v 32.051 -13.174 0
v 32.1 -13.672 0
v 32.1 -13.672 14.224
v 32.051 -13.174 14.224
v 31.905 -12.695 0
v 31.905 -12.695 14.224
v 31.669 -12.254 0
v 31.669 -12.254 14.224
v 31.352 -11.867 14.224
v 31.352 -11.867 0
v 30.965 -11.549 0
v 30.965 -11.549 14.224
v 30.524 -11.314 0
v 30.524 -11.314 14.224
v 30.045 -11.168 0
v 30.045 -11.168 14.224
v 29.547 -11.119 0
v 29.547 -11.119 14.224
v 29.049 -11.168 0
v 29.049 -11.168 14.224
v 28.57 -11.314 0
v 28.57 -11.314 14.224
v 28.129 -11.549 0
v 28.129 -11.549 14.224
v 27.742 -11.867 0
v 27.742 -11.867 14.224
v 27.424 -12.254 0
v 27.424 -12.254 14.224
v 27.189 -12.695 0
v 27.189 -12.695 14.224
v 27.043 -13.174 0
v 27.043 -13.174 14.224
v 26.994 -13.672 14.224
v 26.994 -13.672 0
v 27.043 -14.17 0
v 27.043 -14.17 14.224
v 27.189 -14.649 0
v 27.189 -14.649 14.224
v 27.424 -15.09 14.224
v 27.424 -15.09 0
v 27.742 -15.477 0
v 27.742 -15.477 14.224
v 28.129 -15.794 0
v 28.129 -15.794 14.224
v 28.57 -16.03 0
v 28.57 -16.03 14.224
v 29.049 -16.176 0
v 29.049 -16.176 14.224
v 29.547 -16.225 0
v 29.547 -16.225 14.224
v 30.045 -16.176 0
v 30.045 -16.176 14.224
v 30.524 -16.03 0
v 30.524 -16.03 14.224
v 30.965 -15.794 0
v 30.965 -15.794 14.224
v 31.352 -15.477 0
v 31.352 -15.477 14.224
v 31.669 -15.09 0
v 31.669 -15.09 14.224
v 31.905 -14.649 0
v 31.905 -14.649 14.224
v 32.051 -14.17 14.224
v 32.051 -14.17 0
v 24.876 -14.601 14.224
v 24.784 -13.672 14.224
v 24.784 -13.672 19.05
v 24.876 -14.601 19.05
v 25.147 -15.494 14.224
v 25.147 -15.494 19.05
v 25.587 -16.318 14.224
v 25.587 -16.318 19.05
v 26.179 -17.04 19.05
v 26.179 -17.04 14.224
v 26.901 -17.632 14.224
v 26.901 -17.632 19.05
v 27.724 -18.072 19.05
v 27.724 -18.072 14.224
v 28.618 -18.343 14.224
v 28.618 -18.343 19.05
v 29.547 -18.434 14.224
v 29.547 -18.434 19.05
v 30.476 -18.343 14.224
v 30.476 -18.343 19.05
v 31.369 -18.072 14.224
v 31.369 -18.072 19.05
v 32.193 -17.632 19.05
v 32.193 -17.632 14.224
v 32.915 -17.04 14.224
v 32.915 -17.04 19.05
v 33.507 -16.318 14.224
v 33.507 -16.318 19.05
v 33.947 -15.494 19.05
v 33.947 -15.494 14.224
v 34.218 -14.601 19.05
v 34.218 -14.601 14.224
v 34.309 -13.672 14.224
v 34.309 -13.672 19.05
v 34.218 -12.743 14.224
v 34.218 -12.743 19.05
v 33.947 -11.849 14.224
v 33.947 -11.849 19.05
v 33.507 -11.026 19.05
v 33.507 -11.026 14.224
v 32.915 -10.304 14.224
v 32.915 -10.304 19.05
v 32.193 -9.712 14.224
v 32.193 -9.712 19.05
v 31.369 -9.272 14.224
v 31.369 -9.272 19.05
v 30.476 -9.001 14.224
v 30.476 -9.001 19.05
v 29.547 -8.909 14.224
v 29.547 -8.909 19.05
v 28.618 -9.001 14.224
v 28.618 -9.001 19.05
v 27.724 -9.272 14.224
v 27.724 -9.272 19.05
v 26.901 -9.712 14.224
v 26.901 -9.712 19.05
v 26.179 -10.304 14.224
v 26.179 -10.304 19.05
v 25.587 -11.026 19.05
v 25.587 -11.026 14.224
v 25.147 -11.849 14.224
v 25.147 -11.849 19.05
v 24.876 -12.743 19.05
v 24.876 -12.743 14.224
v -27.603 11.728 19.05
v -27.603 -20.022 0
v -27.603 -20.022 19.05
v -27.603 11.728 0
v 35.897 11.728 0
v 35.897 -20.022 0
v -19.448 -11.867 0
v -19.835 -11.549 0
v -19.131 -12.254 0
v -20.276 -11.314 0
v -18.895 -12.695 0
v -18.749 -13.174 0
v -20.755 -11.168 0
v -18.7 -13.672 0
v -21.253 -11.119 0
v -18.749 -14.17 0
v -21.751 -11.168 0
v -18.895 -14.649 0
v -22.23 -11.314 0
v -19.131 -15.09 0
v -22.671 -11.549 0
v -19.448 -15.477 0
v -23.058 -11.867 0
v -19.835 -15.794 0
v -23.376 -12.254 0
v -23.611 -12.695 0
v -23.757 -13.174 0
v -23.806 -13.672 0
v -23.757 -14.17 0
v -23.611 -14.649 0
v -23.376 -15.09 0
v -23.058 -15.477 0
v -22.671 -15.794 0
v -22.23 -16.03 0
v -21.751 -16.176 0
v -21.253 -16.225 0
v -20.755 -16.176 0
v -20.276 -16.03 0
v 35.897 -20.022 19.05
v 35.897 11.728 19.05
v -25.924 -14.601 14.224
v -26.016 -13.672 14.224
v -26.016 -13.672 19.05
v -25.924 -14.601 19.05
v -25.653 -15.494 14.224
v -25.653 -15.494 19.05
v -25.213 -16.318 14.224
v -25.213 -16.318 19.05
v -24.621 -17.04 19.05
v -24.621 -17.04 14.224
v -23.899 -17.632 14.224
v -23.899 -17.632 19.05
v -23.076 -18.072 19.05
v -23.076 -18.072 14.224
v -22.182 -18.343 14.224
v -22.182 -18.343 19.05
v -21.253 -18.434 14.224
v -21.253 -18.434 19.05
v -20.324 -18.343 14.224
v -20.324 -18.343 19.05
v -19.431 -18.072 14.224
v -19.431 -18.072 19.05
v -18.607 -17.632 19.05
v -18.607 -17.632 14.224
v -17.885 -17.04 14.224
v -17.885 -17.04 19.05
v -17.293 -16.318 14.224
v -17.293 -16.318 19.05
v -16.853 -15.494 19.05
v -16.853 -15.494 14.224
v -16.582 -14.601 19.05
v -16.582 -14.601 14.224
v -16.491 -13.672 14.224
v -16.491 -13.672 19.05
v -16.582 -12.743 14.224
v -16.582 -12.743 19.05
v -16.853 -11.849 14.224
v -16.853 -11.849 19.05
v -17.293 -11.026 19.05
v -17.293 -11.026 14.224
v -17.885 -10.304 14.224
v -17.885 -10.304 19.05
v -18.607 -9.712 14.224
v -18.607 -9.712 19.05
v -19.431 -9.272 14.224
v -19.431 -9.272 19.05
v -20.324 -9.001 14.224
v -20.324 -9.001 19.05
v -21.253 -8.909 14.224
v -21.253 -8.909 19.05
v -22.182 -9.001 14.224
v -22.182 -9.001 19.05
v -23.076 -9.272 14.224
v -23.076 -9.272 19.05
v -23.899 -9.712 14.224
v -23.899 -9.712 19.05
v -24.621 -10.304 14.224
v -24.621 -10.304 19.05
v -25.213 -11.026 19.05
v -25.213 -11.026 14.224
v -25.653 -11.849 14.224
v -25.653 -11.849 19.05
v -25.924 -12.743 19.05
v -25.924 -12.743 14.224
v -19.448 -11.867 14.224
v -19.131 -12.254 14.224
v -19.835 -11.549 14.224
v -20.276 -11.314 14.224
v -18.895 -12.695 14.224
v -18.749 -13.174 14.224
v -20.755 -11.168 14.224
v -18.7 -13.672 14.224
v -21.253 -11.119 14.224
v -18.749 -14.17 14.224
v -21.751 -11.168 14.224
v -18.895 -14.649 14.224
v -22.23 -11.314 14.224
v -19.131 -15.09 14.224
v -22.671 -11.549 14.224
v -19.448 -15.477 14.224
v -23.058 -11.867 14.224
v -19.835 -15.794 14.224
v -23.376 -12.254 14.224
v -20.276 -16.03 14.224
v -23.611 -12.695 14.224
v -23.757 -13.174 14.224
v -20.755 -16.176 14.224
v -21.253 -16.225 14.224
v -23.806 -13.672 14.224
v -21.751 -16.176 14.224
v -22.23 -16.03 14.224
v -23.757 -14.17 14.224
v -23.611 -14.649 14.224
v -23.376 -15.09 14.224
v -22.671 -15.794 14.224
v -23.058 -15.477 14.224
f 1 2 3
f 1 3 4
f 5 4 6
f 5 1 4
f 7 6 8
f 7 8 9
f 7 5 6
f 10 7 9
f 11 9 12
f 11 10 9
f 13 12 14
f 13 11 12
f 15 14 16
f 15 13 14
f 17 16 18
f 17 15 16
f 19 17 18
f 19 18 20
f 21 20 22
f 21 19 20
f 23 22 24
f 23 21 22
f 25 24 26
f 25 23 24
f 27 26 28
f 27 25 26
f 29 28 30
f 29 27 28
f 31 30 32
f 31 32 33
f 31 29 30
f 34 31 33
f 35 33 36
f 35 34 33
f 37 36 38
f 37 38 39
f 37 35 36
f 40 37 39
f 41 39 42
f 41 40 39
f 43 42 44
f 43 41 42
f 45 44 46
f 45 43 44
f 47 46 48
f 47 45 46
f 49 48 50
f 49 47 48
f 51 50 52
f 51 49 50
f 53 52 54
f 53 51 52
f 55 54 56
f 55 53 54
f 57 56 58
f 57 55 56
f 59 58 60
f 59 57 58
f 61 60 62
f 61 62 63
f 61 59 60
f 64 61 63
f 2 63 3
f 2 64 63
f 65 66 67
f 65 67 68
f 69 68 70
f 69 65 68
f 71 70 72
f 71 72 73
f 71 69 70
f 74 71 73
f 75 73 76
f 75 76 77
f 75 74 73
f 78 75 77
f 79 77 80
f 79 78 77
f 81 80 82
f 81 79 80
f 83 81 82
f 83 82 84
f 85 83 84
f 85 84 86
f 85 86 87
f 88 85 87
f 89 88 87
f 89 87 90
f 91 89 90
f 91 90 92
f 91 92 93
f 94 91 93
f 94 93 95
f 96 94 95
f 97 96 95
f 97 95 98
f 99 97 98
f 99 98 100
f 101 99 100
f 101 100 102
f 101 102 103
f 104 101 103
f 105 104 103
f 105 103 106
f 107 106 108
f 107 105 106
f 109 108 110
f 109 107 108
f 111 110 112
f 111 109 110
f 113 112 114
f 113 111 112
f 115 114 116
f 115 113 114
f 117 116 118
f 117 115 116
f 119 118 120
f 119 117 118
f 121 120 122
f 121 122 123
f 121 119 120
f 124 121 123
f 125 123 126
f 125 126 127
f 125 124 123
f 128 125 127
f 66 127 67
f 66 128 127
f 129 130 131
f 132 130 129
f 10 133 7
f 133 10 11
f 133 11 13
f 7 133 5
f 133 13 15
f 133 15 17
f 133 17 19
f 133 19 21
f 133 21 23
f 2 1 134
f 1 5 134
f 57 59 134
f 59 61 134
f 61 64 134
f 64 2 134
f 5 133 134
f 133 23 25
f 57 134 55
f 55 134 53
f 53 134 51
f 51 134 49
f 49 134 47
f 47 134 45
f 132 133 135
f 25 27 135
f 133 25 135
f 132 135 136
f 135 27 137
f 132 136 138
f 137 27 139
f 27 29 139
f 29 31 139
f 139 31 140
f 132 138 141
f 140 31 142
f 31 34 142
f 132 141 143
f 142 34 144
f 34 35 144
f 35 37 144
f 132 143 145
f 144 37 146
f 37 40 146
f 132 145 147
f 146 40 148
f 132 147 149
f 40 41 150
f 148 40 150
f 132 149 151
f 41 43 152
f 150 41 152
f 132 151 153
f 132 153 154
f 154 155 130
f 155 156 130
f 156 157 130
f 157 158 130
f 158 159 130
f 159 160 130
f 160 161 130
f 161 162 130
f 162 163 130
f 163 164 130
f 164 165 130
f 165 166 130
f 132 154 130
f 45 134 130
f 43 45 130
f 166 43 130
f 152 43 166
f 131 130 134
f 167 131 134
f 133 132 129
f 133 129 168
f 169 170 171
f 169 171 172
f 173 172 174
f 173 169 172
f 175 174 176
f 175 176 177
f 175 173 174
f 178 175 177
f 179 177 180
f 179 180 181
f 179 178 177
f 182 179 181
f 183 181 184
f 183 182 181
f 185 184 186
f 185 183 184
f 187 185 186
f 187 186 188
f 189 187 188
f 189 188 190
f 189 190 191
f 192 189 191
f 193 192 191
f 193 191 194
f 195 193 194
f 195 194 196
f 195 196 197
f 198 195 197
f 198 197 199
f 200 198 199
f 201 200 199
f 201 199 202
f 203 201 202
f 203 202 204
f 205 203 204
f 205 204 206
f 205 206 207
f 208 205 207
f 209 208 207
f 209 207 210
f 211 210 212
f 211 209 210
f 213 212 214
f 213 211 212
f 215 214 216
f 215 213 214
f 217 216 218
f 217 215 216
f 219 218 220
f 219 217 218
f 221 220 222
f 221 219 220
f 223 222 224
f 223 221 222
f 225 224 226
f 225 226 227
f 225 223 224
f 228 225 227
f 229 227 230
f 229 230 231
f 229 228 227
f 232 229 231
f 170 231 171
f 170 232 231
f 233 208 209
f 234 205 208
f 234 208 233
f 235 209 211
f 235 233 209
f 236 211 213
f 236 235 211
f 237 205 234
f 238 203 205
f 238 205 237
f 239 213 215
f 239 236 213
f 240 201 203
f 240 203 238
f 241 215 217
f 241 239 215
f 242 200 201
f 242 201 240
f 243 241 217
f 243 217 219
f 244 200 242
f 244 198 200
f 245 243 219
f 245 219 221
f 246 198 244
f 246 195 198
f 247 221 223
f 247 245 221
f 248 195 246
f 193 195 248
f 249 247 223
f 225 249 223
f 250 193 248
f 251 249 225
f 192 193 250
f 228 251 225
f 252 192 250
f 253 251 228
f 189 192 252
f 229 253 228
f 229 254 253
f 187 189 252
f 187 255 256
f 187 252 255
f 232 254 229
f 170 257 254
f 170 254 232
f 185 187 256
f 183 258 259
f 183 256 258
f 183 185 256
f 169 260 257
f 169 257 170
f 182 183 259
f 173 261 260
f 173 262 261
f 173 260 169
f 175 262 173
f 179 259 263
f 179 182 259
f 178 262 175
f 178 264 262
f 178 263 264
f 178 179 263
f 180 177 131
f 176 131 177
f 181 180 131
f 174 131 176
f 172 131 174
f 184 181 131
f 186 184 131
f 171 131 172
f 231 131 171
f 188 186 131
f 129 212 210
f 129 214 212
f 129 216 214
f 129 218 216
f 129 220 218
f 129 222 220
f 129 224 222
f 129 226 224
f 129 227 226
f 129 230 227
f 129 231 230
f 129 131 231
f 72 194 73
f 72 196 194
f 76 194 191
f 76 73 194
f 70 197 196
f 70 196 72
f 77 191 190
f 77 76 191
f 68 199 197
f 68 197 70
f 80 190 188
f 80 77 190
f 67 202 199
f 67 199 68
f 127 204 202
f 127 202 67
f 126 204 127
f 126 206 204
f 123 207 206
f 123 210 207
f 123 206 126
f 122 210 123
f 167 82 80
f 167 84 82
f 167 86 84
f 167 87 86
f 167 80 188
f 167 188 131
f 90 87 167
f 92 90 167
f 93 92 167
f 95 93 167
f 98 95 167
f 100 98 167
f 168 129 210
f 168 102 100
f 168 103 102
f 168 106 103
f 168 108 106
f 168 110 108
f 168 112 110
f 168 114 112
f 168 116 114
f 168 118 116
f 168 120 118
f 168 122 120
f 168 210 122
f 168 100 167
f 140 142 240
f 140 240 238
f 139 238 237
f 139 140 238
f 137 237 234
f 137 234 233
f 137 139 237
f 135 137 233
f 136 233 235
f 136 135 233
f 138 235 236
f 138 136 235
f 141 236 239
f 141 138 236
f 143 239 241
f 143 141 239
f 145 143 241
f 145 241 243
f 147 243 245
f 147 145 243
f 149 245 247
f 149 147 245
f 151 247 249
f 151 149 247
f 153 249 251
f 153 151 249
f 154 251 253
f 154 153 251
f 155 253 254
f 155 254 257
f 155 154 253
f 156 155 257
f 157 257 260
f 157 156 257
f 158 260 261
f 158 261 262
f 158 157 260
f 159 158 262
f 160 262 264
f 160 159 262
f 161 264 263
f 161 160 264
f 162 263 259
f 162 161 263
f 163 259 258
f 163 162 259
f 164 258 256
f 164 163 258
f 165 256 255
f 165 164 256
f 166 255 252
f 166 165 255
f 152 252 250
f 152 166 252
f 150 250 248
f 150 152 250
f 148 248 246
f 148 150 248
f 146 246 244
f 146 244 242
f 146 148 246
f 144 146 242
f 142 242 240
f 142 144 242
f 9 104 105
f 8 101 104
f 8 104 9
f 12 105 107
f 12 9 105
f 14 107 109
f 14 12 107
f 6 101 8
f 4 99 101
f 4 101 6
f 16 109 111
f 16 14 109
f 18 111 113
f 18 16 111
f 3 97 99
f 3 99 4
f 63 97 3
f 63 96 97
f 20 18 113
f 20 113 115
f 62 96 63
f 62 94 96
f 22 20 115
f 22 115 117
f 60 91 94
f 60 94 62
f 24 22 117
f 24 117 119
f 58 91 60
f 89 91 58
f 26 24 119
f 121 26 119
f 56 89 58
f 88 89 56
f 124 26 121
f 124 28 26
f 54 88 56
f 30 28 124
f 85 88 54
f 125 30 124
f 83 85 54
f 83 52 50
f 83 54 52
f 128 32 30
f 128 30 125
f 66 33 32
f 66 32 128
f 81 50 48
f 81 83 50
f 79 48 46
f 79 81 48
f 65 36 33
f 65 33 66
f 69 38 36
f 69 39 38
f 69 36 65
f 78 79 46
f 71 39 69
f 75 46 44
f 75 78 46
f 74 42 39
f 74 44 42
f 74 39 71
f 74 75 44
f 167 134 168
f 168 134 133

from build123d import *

# Parameters (mm, degrees)
SKETCH1_W           = 63.5
SKETCH1_H           = 31.75
SKETCH1_R           = 4.7625
BOSS_EXTRUDE1_DEPTH = 19.05
SKETCH1_3_R         = 4.7625
SKETCH1_3_R_2       = 2.5527
BOSS_EXTRUDE2_DEPTH = 14.224


with BuildPart() as part:
    # Sketch1 → Boss-Extrude1 (new body)
    with BuildSketch(Plane.XY):
        with Locations((4.146938776, -4.146938776)):
            Rectangle(SKETCH1_W, SKETCH1_H)
        with Locations((-21.253061224, -13.671938776)):
            Circle(SKETCH1_R, mode=Mode.SUBTRACT)
        with Locations((29.546938776, -13.671938776)):
            Circle(SKETCH1_R, mode=Mode.SUBTRACT)
    extrude(amount=BOSS_EXTRUDE1_DEPTH)

    # Sketch1<3> → Boss-Extrude2 (add)
    # profile 1 of 2: a face of its own
    with BuildSketch(Plane.XY):
        with Locations((-21.253061224, -13.671938776)):
            Circle(SKETCH1_3_R)
        with Locations((-21.253061224, -13.671938776)):
            Circle(SKETCH1_3_R_2, mode=Mode.SUBTRACT)
    # profile 2 of 2: a face of its own
    with BuildSketch(Plane.XY):
        with Locations((29.546938776, -13.671938776)):
            Circle(SKETCH1_3_R)
        with Locations((29.546938776, -13.671938776)):
            Circle(SKETCH1_3_R_2, mode=Mode.SUBTRACT)
    extrude(amount=BOSS_EXTRUDE2_DEPTH)


solid = part.part
